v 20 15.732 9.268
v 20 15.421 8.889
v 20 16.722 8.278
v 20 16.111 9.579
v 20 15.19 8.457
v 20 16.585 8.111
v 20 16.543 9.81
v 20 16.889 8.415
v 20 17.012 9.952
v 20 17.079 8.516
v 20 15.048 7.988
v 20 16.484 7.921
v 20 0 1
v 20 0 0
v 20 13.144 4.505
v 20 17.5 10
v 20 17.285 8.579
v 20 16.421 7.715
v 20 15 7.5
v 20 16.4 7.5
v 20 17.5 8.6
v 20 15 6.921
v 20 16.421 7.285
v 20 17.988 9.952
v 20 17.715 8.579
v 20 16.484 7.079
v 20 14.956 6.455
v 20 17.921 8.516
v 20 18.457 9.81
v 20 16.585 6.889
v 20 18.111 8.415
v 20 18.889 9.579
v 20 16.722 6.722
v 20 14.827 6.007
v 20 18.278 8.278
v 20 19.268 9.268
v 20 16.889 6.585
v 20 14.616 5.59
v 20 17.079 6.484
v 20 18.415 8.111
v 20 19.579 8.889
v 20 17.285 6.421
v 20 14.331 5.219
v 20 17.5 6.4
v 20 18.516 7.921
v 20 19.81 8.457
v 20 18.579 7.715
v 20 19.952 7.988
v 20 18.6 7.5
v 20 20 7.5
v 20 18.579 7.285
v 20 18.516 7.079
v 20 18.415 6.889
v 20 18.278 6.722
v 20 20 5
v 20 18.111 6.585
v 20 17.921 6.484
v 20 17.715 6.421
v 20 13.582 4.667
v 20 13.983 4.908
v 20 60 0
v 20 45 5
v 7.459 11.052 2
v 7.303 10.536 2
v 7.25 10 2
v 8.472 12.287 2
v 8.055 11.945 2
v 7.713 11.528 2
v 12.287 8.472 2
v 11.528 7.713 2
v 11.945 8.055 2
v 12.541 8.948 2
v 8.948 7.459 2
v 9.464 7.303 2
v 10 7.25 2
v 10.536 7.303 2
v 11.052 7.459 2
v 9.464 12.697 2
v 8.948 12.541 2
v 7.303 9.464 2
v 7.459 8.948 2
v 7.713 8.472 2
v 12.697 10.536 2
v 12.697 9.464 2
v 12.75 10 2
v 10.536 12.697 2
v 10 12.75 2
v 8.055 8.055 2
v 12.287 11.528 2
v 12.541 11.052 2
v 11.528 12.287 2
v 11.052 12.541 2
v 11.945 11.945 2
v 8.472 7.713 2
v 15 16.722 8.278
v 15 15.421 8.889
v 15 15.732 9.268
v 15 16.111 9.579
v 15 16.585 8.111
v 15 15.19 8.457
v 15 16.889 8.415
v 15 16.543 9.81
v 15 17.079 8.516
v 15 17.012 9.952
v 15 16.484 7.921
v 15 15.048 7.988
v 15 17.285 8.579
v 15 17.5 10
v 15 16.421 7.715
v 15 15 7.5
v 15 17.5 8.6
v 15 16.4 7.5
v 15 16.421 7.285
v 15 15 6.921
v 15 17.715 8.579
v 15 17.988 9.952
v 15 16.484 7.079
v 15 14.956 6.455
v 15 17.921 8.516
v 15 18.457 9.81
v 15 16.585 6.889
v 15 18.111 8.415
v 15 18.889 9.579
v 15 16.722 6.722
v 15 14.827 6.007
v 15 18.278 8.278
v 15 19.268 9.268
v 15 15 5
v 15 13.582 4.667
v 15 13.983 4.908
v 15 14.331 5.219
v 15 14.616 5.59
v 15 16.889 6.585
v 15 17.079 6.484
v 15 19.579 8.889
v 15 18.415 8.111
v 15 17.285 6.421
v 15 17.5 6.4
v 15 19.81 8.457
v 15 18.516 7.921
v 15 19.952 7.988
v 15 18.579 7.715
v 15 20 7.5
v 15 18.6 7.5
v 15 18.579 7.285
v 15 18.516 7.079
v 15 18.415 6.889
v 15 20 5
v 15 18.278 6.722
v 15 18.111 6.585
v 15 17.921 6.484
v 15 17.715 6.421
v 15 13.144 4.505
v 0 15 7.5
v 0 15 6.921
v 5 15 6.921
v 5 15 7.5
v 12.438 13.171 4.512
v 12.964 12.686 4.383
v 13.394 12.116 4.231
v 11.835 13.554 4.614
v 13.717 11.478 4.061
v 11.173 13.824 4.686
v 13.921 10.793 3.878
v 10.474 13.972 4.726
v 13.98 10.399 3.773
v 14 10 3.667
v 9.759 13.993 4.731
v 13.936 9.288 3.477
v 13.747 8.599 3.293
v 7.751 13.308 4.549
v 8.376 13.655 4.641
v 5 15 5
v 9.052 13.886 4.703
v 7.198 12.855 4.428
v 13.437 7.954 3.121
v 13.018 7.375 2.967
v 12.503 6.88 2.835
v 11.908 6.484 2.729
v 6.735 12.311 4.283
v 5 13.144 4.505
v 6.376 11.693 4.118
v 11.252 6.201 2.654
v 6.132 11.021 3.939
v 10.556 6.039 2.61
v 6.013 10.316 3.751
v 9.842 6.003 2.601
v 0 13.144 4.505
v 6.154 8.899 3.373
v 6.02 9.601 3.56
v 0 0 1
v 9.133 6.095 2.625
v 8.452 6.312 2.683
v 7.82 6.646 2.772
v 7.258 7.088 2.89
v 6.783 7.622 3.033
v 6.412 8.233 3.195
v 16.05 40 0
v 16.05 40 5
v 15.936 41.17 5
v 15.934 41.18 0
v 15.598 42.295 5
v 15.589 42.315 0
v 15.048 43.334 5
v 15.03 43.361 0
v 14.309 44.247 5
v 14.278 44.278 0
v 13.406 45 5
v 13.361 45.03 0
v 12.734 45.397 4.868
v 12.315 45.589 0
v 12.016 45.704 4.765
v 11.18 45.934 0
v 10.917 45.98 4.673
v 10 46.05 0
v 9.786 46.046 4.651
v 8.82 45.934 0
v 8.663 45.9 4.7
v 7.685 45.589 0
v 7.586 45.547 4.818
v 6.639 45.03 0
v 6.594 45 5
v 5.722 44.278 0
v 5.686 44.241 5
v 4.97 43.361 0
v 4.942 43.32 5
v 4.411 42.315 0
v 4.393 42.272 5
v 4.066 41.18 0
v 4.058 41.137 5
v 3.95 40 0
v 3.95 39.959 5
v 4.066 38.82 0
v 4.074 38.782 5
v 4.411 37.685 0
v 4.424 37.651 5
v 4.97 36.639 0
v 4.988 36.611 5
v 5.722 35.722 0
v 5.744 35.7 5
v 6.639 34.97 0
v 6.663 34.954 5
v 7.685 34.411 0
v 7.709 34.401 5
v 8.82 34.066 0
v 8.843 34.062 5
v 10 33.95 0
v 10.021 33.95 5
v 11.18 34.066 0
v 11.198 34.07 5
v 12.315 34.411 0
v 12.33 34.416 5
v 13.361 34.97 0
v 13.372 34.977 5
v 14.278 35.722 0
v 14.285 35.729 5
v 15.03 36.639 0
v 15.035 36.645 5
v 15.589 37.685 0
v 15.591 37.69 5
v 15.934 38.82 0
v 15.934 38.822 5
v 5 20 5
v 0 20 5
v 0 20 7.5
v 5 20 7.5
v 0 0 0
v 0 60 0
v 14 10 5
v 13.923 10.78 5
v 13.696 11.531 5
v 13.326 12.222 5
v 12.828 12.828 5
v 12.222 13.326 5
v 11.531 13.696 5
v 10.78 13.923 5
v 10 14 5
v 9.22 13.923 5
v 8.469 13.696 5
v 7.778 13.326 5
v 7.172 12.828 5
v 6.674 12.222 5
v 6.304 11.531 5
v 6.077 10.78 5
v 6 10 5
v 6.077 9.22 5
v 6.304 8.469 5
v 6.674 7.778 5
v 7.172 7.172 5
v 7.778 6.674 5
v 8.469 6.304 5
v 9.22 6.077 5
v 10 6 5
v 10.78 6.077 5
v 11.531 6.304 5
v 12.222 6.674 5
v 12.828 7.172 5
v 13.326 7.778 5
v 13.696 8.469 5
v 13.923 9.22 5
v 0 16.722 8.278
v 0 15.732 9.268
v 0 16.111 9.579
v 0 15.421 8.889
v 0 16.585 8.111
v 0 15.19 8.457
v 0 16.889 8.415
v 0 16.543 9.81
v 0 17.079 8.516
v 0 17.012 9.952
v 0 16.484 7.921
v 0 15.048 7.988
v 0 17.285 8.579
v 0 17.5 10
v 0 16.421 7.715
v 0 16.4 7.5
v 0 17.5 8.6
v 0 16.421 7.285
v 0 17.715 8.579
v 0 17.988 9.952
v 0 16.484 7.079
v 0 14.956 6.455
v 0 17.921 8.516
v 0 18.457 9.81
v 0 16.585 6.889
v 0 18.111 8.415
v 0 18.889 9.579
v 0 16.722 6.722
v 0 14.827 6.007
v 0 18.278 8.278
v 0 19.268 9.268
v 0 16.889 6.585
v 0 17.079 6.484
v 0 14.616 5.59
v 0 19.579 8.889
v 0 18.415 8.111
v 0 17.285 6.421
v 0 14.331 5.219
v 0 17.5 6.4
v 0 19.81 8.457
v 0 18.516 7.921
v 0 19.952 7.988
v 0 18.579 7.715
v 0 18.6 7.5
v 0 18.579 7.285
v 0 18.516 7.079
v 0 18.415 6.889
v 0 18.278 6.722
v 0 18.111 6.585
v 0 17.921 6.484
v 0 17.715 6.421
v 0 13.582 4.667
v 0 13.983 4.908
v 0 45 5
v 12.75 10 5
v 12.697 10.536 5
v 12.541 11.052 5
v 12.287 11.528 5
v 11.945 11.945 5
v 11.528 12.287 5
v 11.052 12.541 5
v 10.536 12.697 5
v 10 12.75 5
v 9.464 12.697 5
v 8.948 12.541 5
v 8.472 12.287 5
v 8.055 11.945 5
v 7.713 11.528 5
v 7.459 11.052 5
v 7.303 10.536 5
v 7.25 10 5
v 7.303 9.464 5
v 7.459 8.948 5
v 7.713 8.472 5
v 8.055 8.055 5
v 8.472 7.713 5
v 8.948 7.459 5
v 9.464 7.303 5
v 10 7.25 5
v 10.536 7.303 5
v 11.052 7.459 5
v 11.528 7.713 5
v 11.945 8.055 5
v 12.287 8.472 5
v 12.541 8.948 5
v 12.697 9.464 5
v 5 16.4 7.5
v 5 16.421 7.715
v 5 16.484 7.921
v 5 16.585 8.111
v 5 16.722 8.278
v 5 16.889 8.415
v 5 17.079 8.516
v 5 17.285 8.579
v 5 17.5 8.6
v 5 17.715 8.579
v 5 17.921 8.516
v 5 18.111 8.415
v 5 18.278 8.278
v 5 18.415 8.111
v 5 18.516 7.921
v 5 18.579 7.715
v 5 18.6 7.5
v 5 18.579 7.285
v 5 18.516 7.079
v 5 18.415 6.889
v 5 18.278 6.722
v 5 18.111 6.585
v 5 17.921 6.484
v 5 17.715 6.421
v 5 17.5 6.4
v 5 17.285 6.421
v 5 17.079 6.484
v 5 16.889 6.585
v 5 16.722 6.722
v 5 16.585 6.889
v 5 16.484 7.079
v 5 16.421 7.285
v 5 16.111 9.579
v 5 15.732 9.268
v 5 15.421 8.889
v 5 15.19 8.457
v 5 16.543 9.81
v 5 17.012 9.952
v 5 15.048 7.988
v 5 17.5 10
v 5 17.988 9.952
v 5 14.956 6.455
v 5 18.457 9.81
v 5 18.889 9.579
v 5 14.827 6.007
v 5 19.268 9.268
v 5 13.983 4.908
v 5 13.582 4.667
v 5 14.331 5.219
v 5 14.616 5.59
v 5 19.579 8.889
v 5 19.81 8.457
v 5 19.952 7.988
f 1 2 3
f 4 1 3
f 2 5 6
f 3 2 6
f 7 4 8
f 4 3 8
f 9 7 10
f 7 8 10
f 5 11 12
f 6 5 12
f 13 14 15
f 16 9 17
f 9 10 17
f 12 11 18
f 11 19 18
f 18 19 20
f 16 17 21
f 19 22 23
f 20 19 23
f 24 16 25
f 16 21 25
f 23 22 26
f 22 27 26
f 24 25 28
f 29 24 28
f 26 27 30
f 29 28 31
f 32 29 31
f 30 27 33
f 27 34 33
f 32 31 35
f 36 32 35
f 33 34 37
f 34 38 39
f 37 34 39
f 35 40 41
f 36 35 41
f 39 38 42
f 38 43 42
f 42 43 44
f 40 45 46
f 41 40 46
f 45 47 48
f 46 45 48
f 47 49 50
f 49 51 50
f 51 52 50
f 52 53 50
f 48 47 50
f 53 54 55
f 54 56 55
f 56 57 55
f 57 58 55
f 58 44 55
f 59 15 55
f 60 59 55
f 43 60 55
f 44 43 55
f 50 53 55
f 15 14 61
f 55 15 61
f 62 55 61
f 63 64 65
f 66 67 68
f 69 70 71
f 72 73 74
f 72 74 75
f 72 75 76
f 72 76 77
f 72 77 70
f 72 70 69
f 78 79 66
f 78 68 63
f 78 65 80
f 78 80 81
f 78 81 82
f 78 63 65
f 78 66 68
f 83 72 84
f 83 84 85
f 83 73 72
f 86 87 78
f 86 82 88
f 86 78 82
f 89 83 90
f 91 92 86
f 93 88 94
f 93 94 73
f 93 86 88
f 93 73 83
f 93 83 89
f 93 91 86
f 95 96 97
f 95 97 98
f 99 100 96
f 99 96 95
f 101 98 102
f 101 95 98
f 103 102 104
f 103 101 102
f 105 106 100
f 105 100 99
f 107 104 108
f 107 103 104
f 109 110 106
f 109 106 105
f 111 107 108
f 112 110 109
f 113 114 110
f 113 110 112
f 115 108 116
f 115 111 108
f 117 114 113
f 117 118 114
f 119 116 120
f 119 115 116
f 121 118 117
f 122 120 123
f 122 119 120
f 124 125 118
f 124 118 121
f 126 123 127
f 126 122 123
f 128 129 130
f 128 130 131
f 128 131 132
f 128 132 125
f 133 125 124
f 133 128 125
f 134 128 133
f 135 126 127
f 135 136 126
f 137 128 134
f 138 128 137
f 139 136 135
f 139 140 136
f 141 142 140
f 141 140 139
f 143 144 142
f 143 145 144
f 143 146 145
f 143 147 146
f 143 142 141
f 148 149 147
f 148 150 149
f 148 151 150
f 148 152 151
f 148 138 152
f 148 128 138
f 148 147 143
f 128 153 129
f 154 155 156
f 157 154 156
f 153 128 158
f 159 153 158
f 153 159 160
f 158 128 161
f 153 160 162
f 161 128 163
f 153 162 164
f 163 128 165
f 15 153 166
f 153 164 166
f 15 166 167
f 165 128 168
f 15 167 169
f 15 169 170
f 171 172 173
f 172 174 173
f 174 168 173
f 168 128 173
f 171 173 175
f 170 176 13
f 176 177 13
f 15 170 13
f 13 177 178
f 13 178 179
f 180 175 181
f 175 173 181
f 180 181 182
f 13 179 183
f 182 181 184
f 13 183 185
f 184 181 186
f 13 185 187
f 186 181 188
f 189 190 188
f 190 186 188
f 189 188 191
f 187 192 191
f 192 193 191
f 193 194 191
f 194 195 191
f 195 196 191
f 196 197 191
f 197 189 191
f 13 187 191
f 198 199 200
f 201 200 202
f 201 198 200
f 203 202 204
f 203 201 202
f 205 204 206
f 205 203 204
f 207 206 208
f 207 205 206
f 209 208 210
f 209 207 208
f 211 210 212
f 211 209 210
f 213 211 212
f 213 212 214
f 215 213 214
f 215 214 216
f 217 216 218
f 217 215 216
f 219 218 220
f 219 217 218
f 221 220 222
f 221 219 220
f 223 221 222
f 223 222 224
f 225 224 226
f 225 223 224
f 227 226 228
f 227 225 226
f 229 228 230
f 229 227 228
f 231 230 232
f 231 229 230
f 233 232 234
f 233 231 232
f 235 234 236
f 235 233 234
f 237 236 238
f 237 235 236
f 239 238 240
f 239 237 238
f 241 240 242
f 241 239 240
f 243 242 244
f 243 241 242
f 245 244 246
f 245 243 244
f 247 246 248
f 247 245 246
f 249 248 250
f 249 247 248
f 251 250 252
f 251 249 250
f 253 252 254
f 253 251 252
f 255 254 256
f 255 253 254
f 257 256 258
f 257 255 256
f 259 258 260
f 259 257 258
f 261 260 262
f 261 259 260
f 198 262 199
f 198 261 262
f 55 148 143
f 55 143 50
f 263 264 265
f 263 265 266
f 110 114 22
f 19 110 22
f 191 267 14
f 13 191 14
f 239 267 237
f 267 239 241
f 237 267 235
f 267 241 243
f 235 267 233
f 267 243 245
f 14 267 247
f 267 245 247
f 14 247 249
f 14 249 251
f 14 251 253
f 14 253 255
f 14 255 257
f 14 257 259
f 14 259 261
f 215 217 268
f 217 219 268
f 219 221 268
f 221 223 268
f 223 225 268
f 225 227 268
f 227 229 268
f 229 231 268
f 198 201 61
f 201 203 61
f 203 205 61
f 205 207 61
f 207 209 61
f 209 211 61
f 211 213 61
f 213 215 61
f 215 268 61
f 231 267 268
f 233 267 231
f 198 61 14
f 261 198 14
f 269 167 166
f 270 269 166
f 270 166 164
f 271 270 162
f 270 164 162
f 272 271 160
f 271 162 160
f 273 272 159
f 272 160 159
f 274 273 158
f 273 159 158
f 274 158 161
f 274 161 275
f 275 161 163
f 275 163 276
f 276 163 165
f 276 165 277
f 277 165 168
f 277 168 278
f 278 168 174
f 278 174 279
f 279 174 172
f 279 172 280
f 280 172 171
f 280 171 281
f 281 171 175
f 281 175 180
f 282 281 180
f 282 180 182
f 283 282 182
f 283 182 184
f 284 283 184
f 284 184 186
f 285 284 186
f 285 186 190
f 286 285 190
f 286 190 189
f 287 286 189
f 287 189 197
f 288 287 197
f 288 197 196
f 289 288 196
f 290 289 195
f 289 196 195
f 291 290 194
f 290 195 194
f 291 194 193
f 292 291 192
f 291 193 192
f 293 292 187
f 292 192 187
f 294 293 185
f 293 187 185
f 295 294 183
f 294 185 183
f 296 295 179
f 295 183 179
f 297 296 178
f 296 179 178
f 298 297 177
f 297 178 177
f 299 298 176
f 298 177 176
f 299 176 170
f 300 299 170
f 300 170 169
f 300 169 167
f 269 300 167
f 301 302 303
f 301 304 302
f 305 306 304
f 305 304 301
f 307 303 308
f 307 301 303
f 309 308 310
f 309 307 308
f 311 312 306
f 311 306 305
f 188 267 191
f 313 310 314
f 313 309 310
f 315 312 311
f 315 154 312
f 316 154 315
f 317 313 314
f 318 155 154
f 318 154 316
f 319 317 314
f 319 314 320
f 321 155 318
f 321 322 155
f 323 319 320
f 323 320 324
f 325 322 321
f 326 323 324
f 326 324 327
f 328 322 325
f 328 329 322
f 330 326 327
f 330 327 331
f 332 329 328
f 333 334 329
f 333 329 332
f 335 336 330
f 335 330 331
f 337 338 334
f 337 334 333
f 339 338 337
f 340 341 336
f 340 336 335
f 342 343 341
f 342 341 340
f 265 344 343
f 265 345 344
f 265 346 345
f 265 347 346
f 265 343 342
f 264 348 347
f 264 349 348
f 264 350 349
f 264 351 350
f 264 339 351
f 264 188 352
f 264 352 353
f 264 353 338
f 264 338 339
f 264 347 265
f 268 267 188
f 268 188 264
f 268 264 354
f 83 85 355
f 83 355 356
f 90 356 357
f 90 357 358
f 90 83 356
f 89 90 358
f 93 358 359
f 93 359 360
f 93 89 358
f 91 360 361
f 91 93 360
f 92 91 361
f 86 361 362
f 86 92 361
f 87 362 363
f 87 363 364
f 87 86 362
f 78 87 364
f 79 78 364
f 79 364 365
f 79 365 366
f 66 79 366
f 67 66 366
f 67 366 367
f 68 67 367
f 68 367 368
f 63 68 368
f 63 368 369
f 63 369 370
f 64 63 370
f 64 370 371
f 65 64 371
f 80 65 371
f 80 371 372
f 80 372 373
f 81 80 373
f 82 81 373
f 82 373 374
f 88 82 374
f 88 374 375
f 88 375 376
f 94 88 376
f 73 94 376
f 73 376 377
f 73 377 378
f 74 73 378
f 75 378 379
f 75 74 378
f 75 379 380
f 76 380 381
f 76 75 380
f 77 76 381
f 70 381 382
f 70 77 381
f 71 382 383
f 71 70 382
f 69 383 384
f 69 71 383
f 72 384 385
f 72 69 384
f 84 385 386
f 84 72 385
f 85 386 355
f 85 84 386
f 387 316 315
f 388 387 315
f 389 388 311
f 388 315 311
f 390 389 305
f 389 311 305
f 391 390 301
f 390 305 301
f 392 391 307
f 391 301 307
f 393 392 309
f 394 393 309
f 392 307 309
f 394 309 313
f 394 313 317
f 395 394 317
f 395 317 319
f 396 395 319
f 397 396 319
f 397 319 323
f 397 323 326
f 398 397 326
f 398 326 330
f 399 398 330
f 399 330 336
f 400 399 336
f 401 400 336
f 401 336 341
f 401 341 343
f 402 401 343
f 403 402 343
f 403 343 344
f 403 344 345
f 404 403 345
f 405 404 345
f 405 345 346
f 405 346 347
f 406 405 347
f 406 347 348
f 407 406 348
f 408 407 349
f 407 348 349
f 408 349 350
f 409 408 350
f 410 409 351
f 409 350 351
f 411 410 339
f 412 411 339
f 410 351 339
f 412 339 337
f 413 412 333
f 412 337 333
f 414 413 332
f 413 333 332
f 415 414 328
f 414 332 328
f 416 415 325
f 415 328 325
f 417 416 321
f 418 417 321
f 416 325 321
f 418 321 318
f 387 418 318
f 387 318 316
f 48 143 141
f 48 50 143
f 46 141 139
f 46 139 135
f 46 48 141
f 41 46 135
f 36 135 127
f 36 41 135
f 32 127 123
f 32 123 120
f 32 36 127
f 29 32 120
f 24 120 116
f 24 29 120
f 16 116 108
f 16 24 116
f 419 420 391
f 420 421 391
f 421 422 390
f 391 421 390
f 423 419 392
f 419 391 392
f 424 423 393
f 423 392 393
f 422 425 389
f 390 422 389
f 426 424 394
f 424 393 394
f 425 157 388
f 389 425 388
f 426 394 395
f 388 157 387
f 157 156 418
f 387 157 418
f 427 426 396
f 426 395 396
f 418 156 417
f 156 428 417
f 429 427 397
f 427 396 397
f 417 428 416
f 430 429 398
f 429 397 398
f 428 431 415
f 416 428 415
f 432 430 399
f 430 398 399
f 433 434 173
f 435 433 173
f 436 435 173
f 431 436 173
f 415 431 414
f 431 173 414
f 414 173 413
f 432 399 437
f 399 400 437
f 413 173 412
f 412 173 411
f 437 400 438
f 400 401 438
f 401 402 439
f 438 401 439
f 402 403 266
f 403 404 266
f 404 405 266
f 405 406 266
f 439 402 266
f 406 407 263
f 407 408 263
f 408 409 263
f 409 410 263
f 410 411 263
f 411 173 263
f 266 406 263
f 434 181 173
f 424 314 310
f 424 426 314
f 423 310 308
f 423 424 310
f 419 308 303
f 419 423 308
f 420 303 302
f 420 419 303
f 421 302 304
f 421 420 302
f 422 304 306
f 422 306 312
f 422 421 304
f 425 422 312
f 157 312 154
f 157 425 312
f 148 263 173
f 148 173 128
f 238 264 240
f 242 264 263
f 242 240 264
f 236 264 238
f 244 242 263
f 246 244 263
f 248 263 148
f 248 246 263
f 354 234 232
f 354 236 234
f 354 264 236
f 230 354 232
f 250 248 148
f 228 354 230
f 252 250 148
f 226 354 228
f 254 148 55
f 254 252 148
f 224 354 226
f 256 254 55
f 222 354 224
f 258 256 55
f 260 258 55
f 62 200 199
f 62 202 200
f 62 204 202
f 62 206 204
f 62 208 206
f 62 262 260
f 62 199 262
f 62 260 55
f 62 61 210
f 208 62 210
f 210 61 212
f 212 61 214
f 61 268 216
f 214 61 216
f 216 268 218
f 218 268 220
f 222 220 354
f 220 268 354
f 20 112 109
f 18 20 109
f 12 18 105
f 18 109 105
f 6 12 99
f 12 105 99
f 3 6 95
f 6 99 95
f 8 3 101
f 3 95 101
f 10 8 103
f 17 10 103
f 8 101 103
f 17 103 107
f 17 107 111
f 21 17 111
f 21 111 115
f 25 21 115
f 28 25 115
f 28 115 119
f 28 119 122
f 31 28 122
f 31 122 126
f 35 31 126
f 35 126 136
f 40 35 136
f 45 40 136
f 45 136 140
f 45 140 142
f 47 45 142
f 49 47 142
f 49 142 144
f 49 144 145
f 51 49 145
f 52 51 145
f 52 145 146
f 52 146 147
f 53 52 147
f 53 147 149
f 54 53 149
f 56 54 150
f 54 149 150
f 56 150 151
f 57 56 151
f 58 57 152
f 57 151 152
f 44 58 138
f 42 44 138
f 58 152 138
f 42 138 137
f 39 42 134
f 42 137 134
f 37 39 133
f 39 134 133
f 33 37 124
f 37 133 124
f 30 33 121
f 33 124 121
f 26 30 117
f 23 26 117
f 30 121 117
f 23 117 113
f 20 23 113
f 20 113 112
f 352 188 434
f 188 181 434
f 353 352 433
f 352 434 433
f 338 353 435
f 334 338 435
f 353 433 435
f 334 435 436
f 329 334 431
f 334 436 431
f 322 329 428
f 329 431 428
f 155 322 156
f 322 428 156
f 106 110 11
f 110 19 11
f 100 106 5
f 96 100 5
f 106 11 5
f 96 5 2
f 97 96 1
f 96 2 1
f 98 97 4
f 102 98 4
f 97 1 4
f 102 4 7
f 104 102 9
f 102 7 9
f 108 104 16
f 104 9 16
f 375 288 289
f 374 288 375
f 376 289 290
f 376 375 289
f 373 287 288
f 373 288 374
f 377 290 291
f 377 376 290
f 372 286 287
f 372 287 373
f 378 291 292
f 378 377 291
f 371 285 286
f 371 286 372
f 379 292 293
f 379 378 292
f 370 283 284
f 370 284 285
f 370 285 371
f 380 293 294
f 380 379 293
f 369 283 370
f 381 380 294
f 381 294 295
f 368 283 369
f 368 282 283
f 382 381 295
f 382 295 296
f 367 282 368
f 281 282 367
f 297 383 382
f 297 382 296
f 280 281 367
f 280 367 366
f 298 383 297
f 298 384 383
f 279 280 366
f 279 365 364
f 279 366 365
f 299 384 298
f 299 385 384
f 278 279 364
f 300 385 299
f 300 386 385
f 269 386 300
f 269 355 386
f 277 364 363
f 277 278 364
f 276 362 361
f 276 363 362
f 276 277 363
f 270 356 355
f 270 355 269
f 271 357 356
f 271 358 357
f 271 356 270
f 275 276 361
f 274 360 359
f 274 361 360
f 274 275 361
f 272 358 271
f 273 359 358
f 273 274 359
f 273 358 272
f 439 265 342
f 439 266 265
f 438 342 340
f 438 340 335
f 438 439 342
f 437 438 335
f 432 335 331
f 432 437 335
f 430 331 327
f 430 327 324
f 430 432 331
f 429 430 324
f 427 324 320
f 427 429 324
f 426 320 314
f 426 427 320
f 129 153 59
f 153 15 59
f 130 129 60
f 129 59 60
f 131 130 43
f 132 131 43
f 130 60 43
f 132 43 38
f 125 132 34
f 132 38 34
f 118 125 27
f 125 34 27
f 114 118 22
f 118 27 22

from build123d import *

# Parameters (mm, degrees)
F0_W         = 20
F0_H         = 60
F0_R         = 4
F0_R_2       = 6.05
F1_DEPTH     = 4
F1_FACE_W    = 20
F1_FACE_H    = 60
F1_FACE_R    = 4
F1_FACE_R_2  = 6.05
F0_R_3       = 2.75
F2_DEPTH     = 1
F3_W         = 5
F3_H         = 5
F4_DEPTH     = 5
F5_T1_DEPTH  = 97.9025398997
F6_R         = 2.49999
F7_R         = 1.1
F8_DEPTH     = 25
F9_DEPTH     = 5
F10_T1_DEPTH = 97.8518303197
F11_DEPTH    = 2


# Not quite as in the source:
# - a fillet or chamfer that OpenCascade refuses, or shapes differently, is made with other operations: its cross-section is extruded or revolved along the edge and cut away or added
# - a fillet or chamfer is up to 0.001 mm smaller than in the source, because OpenCascade refuses the exact size


with BuildPart() as f1:
    # F0 (on Top) → F1 (new body)
    with BuildSketch(Plane.XY):
        with Locations((10, 30)):
            Rectangle(F0_W, F0_H)
        with Locations((10, 10)):
            Circle(F0_R, mode=Mode.SUBTRACT)
        with Locations((10, 40)):
            Circle(F0_R_2, mode=Mode.SUBTRACT)
    extrude(amount=F1_DEPTH)

    # F1_face (on face) + F0 (on Top) → F2 (join)
    with BuildSketch(Plane(origin=(10, 29.8602632633, 4), x_dir=(1, 0, 0), z_dir=(0, 0, 1))):
        with Locations((0, 0.1397367367)):
            Rectangle(F1_FACE_W, F1_FACE_H)
        with Locations((0, -19.8602632633)):
            Circle(F1_FACE_R, mode=Mode.SUBTRACT)
        with Locations((0, 10.1397367367)):
            Circle(F1_FACE_R_2, mode=Mode.SUBTRACT)
    with BuildSketch(Plane.XY):
        with Locations((10, 10)):
            Circle(F0_R)
        with Locations((10, 10)):
            Circle(F0_R_3, mode=Mode.SUBTRACT)
    extrude(amount=F2_DEPTH)

    # F3 (on face) → F4 (join)
    with BuildSketch(Plane.XY.offset(5)):
        with Locations((2.5, 17.5)):
            Rectangle(F3_W, F3_H)
        with Locations((17.5, 17.5)):
            Rectangle(F3_W, F3_H)
    extrude(amount=F4_DEPTH)

    # F5: chamfer of 15 x 4 on 1 edges, made by hand

    # F5_s2 → F5_t1 (cut)
    with BuildSketch(Plane.YZ.offset(-38.9512699498)):
        Polygon((15, 5), (0, 1), (0, 5), align=None)
    extrude(amount=F5_T1_DEPTH, mode=Mode.SUBTRACT)

    # F6 (radius 2.5 in the source; OpenCascade refuses exactly that, so slightly less here)
    f6_edges = [f1.edges().sort_by_distance(p)[0] for p in [
        (2.5, 15, 5),
        (2.5, 15, 10),
        (17.5, 15, 5),
        (17.5, 15, 10),
        (2.5, 20, 10),
        (17.5, 20, 10),
    ]]
    fillet(f6_edges, radius=F6_R)

    # F7 (on face) → F8 (cut)
    with BuildSketch(Plane(origin=(0, 0, 0), x_dir=(0, -1, 0), z_dir=(-1, 0, 0))):
        with Locations((-17.5, 7.5)):
            Circle(F7_R)
    extrude(amount=-F8_DEPTH, mode=Mode.SUBTRACT)

    # F10: chamfer of 5 x 15 on 1 edges, made by hand

    # F10_s2 → F10_t1 (cut)
    with BuildSketch(Plane.YZ.offset(-38.9259151598)):
        Polygon((60, 0), (45, 5), (60, 5), align=None)
    extrude(amount=F10_T1_DEPTH, mode=Mode.SUBTRACT)



with BuildPart() as f9:
    # F0 (on Top) → F9 (new body)
    with BuildSketch(Plane.XY):
        with Locations((10, 10)):
            Circle(F0_R)
        with Locations((10, 10)):
            Circle(F0_R_3, mode=Mode.SUBTRACT)
    extrude(amount=F9_DEPTH)


with BuildPart() as f1_1:
    add(f1.part)

    add(f9.part)  # F11 merges F9
    # F0 (on Top) → F11 (join)
    with BuildSketch(Plane.XY):
        with Locations((10, 10)):
            Circle(F0_R_3)
    extrude(amount=F11_DEPTH)


solid = f1_1.part
